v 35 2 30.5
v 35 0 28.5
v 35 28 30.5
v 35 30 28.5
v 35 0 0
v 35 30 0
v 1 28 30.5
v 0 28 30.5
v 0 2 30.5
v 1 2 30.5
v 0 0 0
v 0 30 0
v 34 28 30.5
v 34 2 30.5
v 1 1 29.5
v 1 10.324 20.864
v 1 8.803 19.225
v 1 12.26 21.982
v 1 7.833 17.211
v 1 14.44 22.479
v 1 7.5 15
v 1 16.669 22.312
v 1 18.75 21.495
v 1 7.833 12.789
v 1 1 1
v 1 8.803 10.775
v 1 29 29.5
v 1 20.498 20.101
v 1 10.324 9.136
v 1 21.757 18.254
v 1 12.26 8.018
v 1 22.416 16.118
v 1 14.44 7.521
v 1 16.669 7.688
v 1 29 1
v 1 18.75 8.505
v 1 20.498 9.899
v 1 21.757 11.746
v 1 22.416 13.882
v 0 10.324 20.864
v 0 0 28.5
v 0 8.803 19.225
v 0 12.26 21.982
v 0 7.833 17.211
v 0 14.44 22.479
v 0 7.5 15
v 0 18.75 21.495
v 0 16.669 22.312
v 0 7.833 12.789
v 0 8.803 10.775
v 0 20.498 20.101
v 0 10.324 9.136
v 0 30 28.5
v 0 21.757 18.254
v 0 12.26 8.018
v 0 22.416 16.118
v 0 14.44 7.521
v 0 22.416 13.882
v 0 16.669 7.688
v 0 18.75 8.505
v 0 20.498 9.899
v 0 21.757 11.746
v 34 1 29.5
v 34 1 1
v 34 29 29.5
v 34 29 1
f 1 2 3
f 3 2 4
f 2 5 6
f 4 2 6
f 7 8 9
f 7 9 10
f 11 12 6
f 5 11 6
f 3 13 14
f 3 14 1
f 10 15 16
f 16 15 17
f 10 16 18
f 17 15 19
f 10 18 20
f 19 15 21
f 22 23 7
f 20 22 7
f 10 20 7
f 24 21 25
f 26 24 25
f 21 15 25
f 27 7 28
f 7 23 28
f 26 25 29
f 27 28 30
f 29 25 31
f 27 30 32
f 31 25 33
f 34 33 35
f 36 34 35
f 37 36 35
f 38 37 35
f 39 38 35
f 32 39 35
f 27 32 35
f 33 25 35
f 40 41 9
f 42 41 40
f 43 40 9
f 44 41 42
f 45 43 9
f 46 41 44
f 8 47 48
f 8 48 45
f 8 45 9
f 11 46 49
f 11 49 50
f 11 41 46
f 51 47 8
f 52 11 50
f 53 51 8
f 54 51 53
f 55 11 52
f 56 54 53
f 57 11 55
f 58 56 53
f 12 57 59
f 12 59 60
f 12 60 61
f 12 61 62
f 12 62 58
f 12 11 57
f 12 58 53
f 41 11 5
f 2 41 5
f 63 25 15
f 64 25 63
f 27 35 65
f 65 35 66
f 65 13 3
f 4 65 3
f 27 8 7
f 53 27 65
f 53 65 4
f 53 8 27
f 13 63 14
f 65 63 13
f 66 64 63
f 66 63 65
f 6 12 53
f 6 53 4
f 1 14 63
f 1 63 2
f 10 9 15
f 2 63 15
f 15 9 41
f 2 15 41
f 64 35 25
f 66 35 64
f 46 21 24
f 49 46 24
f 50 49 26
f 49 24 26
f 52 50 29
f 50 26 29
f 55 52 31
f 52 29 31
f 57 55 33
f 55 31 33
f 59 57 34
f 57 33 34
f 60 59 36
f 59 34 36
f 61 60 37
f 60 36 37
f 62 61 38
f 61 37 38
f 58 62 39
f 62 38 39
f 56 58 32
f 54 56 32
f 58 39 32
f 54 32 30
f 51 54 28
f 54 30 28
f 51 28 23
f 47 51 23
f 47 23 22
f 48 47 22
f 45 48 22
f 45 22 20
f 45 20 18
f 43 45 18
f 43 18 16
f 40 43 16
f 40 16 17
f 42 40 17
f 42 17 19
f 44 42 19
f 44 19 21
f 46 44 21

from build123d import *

# Parameters (mm, degrees)
F0_W        = 35
F0_H        = 30
F1_DEPTH    = 30.5
F2_T        = -1
F4_D        = 15
F4_DEPTH    = 12
F4_TIP      = 4.5064546427
F5_T1_DEPTH = 45.2867319519
F6_T1_DEPTH = 45.2867319519


# Not quite as in the source:
# - a fillet or chamfer that OpenCascade refuses, or shapes differently, is made with other operations: its cross-section is extruded or revolved along the edge and cut away or added


with BuildPart() as f1:
    # F0 (on Top) → F1 (new body)
    with BuildSketch(Plane.XY):
        with Locations((17.5, 15)):
            Rectangle(F0_W, F0_H)
    extrude(amount=F1_DEPTH)

    # F2
    f2_openings = [f1.faces().sort_by_distance(p)[0] for p in [
        (17.5, 15, 30.5),
    ]]
    offset(amount=F2_T, openings=f2_openings)

    # F4
    with Locations(Plane(origin=(0, 0, 0), x_dir=(0, 1, 0), z_dir=(-1, 0, 0))):
        with Locations((15, -15)):
            Hole(F4_D / 2, depth=F4_DEPTH)
            with Locations((0, 0, -(F4_DEPTH + F4_TIP / 2))):  # 118° drill point
                Cone(0, F4_D / 2, F4_TIP, mode=Mode.SUBTRACT)

    # F5: chamfer of 2 on 1 edges, made by hand

    # F5_s2 → F5_t1 (cut)
    with BuildSketch(Plane.YZ.offset(-5.1433659759)):
        Polygon((2, 30.5), (0, 28.5), (0, 30.5), align=None)
    extrude(amount=F5_T1_DEPTH, mode=Mode.SUBTRACT)

    # F6: chamfer of 2 on 1 edges, made by hand

    # F6_s2 → F6_t1 (cut)
    with BuildSketch(Plane.YZ.offset(-5.1433659759)):
        Polygon((28, 30.5), (30, 28.5), (30, 30.5), align=None)
    extrude(amount=F6_T1_DEPTH, mode=Mode.SUBTRACT)


solid = f1.part
